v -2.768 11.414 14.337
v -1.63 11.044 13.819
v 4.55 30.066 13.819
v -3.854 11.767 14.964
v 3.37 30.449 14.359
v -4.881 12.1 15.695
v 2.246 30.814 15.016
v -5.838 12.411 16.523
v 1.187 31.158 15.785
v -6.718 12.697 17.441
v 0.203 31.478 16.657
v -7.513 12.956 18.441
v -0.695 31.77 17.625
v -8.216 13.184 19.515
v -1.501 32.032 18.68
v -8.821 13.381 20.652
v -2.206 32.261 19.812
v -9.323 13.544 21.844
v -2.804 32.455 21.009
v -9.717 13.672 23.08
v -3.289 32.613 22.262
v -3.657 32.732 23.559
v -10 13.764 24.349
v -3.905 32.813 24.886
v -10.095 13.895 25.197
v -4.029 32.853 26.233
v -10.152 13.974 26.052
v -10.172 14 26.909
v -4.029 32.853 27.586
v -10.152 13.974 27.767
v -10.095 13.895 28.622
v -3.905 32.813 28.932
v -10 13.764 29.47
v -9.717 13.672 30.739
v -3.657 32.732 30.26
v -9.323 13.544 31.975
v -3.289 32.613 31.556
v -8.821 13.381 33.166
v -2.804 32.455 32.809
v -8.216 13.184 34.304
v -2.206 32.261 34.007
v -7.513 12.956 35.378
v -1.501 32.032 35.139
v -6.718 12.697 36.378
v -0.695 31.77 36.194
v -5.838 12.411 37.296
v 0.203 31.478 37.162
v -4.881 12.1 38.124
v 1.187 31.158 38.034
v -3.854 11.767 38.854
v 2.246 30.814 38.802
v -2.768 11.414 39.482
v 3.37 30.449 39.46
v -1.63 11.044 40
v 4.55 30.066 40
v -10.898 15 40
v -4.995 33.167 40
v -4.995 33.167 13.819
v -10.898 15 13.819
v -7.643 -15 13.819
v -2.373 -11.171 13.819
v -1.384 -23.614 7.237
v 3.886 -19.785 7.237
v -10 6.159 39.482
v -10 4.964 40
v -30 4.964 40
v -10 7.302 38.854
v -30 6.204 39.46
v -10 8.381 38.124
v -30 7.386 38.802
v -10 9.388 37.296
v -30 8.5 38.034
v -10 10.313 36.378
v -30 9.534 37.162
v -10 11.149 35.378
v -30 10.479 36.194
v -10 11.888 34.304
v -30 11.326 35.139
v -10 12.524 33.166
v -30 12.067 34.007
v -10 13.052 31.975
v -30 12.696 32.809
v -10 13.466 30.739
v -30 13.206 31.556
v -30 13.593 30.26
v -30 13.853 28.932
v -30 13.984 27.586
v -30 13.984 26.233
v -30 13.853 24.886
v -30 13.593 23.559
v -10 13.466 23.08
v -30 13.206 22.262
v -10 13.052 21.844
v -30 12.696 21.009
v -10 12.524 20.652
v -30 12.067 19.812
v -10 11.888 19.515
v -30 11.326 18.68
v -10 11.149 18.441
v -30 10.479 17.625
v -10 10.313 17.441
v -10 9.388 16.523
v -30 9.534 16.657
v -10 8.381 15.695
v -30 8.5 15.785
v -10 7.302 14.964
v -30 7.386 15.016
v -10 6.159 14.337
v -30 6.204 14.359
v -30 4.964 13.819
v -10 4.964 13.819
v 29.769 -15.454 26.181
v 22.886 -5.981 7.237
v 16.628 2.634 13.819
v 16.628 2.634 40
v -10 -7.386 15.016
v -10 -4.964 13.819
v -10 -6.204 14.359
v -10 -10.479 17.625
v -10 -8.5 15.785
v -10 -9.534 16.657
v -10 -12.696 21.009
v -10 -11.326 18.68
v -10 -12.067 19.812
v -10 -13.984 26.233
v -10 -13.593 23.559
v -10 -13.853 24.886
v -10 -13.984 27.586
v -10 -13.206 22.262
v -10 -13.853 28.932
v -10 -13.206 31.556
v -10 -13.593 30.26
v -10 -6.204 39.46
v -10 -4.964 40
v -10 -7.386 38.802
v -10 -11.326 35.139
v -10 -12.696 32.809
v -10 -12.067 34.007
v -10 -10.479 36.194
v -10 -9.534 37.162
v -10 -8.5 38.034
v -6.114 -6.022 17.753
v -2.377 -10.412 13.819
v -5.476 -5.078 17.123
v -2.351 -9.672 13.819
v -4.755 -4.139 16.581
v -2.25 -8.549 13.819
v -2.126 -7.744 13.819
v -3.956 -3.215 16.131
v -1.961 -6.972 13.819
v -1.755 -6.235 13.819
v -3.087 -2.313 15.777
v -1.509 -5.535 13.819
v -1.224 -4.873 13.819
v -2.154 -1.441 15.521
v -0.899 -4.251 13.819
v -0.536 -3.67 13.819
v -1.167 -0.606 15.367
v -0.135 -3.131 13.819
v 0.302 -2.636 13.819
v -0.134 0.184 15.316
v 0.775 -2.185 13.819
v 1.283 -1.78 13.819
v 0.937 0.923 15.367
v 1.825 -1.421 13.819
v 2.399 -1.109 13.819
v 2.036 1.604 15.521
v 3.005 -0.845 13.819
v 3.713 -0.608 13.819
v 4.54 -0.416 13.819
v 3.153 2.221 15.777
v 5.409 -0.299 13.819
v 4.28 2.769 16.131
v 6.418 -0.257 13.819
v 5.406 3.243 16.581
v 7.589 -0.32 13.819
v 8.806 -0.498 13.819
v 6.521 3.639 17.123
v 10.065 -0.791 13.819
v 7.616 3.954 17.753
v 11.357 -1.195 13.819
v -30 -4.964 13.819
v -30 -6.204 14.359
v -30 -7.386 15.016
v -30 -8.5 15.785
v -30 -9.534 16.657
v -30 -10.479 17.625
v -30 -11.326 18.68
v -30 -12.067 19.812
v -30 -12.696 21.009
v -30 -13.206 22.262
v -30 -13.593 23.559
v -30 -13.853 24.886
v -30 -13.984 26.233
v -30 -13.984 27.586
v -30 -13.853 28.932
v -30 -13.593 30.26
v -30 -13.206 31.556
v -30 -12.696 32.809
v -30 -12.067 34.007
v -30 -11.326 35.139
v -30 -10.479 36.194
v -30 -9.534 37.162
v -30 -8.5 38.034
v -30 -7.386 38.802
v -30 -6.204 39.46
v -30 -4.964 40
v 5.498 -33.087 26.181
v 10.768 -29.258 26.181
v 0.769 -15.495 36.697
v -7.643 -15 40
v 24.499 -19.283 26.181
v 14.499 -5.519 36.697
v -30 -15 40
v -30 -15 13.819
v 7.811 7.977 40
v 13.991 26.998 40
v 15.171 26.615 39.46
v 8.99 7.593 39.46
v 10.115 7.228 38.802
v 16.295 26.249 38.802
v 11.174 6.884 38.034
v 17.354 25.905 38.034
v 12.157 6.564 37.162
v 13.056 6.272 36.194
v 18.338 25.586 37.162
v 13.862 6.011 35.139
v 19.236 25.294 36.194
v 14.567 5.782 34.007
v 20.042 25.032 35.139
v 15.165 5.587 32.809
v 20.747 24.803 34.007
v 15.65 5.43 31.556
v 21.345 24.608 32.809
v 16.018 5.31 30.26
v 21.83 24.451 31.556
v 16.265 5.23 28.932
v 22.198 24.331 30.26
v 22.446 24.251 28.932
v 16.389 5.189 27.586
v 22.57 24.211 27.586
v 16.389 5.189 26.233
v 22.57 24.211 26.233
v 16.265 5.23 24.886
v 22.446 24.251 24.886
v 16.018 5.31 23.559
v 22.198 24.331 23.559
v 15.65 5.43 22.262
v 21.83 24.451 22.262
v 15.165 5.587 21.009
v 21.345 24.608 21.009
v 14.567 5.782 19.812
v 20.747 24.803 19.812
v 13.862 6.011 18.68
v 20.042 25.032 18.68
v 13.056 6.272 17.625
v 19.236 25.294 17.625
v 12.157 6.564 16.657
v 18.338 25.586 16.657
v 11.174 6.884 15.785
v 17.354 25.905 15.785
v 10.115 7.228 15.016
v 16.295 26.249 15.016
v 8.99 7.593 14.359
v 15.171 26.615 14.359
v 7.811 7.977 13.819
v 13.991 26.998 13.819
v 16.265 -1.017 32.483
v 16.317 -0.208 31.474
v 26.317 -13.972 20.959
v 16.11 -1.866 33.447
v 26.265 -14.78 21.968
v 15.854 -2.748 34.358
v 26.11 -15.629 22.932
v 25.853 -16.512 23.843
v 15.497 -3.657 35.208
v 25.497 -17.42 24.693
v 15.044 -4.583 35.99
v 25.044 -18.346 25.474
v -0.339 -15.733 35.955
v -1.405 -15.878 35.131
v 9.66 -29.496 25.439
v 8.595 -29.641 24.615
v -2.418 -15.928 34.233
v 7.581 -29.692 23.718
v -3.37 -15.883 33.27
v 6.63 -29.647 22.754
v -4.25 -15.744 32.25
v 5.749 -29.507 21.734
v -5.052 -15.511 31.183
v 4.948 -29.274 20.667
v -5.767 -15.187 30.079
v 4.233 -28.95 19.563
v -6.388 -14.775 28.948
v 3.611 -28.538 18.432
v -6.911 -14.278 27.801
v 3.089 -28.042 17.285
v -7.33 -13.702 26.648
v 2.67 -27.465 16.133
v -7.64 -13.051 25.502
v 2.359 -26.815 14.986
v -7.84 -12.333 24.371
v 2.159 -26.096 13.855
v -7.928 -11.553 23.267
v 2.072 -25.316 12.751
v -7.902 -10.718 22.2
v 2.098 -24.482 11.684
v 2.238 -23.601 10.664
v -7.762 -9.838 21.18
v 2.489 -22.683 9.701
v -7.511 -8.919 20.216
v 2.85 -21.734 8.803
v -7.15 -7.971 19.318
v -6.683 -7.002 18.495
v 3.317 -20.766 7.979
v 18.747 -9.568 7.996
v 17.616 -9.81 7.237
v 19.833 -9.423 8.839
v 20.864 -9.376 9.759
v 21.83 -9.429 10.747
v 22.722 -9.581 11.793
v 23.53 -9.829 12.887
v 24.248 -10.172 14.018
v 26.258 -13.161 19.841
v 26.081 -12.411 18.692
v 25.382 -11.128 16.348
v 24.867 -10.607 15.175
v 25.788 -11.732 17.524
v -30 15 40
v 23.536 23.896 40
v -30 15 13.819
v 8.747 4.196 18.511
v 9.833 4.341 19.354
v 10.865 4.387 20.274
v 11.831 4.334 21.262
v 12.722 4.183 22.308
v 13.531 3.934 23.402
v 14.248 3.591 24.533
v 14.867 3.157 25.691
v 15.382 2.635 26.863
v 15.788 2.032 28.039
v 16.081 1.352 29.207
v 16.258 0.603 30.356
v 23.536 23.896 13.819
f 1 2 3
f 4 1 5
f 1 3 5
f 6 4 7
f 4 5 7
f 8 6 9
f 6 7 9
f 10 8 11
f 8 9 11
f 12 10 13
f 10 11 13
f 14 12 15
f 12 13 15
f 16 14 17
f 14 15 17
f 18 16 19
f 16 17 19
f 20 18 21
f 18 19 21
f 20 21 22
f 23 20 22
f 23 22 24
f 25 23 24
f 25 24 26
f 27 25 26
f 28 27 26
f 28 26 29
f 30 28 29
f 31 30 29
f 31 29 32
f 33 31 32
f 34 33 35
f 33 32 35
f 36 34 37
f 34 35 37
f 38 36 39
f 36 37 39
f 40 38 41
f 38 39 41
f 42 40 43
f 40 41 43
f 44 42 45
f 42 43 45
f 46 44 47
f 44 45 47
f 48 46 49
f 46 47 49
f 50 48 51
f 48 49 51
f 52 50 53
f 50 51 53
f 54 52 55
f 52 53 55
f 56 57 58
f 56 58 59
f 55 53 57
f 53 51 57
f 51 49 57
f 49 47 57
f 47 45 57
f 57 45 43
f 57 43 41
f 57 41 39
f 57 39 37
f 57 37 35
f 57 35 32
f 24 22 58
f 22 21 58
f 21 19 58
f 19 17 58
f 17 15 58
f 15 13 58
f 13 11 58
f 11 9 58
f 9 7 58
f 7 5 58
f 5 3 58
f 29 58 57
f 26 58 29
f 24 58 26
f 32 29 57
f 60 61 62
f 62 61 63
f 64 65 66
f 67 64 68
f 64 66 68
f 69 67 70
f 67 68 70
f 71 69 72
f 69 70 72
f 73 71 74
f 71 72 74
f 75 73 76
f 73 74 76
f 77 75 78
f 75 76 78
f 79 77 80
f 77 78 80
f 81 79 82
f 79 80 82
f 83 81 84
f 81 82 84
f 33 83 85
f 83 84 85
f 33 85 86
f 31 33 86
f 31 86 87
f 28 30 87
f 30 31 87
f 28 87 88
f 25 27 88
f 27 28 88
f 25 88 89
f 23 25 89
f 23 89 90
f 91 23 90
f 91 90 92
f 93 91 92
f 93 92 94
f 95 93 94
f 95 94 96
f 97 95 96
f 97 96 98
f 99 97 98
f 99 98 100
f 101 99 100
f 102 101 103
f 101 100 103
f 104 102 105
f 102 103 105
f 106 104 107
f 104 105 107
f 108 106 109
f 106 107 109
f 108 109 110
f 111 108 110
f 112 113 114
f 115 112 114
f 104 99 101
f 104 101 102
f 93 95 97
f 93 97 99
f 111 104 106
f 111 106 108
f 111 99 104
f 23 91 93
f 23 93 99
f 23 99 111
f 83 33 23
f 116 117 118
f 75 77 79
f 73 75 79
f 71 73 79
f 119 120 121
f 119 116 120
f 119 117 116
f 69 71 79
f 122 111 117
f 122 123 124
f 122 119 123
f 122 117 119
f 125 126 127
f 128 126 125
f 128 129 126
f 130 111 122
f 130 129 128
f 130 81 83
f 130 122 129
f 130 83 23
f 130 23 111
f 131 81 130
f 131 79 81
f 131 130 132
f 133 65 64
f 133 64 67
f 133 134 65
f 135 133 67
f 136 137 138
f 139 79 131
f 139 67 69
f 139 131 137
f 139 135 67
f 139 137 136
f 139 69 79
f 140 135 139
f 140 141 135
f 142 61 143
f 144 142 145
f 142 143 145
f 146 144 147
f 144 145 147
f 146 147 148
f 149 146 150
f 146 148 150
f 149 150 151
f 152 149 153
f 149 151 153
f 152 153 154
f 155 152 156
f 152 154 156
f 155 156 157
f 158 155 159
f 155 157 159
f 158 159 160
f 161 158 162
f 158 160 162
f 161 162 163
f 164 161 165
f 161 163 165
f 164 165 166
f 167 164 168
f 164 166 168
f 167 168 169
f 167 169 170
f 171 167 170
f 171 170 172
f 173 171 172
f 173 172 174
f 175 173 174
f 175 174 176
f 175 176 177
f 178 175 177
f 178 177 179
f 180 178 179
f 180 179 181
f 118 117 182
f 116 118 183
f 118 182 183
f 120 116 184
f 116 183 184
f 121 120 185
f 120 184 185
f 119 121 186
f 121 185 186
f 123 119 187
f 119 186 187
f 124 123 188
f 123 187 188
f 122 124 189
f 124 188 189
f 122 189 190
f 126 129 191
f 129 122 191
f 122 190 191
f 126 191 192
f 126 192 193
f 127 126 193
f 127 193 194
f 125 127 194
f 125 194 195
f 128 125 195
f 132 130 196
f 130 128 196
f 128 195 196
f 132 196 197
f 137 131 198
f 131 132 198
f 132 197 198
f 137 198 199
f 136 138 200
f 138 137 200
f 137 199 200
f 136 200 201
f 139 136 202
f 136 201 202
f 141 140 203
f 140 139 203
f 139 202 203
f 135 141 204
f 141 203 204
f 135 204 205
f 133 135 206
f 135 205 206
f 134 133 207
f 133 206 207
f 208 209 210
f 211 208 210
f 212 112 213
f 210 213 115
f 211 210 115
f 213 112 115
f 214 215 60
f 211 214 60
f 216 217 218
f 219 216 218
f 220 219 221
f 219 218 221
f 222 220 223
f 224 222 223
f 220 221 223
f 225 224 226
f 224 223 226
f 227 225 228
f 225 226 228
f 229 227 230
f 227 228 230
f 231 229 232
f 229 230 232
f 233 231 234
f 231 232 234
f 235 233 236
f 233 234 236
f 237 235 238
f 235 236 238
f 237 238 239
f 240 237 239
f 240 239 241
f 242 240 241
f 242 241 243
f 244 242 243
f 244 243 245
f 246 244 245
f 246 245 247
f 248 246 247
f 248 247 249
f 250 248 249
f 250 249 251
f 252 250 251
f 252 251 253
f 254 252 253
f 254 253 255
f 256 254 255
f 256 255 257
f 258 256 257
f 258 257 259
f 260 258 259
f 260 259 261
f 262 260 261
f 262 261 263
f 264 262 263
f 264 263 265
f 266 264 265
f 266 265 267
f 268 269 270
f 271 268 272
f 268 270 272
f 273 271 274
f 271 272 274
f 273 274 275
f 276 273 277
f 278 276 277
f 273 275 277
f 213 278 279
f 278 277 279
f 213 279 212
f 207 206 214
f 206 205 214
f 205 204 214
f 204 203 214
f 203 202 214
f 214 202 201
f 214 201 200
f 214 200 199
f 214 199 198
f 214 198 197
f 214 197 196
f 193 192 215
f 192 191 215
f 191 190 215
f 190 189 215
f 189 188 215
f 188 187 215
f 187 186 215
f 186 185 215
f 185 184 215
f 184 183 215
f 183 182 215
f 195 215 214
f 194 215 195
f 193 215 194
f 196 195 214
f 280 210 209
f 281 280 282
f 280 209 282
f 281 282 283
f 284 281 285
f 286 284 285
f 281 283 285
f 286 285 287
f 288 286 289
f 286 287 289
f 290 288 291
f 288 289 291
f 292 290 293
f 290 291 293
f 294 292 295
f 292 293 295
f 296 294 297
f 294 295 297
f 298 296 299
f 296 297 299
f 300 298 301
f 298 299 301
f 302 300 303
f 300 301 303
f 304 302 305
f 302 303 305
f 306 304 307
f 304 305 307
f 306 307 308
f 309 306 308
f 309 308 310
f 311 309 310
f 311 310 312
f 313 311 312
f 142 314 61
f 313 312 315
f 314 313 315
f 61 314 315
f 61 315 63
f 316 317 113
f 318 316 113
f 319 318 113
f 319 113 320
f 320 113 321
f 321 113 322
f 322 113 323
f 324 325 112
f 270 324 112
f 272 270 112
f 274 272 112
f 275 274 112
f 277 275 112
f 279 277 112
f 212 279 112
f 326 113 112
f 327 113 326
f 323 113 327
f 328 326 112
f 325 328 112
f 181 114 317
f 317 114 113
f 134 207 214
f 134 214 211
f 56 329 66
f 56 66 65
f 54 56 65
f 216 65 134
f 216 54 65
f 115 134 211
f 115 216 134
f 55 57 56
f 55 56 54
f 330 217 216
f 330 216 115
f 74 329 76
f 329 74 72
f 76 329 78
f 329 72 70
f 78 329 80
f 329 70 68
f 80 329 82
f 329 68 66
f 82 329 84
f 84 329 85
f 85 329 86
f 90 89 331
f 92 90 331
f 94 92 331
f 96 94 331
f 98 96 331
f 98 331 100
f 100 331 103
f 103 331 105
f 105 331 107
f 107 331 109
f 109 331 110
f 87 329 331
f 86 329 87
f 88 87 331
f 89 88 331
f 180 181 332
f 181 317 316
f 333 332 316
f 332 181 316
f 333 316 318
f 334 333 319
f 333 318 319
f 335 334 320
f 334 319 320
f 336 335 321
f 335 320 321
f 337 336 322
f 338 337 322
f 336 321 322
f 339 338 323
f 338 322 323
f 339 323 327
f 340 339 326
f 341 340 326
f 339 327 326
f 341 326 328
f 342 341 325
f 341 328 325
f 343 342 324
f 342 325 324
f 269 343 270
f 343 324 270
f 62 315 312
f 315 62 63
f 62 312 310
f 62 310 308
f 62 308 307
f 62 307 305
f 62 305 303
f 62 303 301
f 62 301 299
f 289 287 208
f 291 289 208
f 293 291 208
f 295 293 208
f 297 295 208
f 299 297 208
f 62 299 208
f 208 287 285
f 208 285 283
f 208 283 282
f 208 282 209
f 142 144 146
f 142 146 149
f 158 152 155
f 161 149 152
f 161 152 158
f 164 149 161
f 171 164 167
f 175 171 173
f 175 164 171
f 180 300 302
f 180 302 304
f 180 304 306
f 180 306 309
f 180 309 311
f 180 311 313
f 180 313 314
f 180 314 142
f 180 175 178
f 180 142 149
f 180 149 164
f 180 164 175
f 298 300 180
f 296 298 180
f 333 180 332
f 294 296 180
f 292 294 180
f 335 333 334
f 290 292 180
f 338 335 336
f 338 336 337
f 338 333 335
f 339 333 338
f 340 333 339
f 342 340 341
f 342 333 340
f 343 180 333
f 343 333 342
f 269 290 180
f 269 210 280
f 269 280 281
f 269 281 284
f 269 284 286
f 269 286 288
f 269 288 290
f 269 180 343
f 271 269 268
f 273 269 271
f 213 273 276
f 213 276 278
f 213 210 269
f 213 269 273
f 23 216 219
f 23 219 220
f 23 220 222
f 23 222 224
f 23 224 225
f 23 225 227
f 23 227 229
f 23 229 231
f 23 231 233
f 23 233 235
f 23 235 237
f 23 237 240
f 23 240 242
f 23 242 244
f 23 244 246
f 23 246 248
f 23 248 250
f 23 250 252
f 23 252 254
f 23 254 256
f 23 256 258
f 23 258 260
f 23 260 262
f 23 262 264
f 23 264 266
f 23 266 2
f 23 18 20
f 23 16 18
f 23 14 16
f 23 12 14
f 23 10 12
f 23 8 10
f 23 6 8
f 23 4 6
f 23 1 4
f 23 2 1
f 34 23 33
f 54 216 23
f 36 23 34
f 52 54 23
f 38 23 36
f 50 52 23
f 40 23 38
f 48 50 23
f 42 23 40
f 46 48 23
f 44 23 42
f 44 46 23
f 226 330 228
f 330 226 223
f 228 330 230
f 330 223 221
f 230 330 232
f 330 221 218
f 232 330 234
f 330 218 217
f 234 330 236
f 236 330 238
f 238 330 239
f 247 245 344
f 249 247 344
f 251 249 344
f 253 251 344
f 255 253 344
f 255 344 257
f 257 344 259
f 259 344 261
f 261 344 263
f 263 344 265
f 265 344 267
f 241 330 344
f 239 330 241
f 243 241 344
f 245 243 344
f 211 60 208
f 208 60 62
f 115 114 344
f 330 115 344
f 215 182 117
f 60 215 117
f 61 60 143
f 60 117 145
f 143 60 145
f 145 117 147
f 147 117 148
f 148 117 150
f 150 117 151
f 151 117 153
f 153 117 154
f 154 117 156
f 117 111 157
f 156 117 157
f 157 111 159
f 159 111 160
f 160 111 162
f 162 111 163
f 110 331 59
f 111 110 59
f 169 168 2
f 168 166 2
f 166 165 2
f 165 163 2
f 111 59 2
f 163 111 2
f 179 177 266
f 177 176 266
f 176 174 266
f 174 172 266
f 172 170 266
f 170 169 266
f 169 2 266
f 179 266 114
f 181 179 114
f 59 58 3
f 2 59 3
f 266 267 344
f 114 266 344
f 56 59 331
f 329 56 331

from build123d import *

# Parameters (mm, degrees)
F1_DEPTH  = 40
F3_DEPTH  = 30
F4_DEPTH  = 13.8188209357
F6_DEPTH  = 20
F7_R      = 14
F8_DEPTH  = 20
F9_R      = 14
F10_DEPTH = 20


with BuildPart() as f1:
    # F0 (on Top) → F1 (new body)
    with BuildSketch(Plane.XY):
        Polygon((17.6335575688, -24.2705098312), (0, 0), (-30, 0), (-30, -15), (-7.6428817424, -15), (5.4983026531, -33.0872886156), align=None)
        Polygon((9.2705098312, 28.5316954889), (0, 0), (17.6335575688, -24.2705098312), (29.7688124844, -15.4537310469), (16.6276280888, 2.6335575688), (23.5363575757, 23.8964405732), align=None)
        Polygon((-30, 0), (0, 0), (9.2705098312, 28.5316954889), (-4.9953379132, 33.1669504045), (-10.8981379201, 15), (-30, 15), align=None)
    extrude(amount=F1_DEPTH)

    # F2 (on face) → F3 (cut, through all)
    with BuildSketch(Plane(origin=(12.1352549156, 8.8167787844, 0), x_dir=(-0.5877852523, 0.8090169944, 0), z_dir=(0.8090169944, 0.5877852523, 0))):
        Polygon((-30, 26.1811790643), (-7.6428817424, 40), (-30, 40), align=None)
        Polygon((-18.2909047095, 7.2373321675), (-30, 26.1811790643), (-30, 0), (-7.6428817424, 0), (-7.6428817424, 13.8188209357), align=None)
    extrude(amount=-F3_DEPTH, mode=Mode.SUBTRACT)

    # F4 (cut, through all): a face of the model
    f4_faces = [f1.faces().sort_by_distance(p)[0] for p in [
        (-5.1613250879, 7.1039545366, 0),
    ]]
    extrude(f4_faces, amount=-F4_DEPTH, mode=Mode.SUBTRACT)

    # F5 (on face) → F6 (cut)
    with BuildSketch(Plane(origin=(5.8766333563, -8.0884919048, -6.1796670384), x_dir=(0.8660332683, 0.3973019791, 0.303541621), z_dir=(0.4999863781, -0.6881722113, -0.5257686082))):
        with BuildLine():
            ThreePointArc((13.555551142, 11.7065510585), (20.8125243081, 16.7507031763), (23.6020646696, 25.1367388722))
            ThreePointArc((23.6020646696, 25.1367388722), (23.0669801184, 28.9702818755), (21.5026286756, 32.5107863592))
            Line((21.5026286756, 32.5107863592), (5.6485781973, 38.566926686))
            ThreePointArc((5.6485781973, 38.566926686), (-3.4762295905, 30.1325590497), (-2.2984993363, 17.7626913852))
            Line((-2.2984993363, 17.7626913852), (13.555551142, 11.7065510585))
        make_face()
        with BuildLine():
            ThreePointArc((-2.2984993363, 17.7626913852), (4.6062444921, 12.0584446121), (13.555551142, 11.7065510585))
            Line((13.555551142, 11.7065510585), (-2.2984993363, 17.7626913852))
        make_face()
    extrude(amount=-F6_DEPTH, mode=Mode.SUBTRACT)

    # F7 (on face) → F8 (cut)
    with BuildSketch(Plane(origin=(9.2705098312, 28.5316954889, 0), x_dir=(-0.9510565163, 0.3090169944, 0), z_dir=(0.3090169944, 0.9510565163, 0))):
        with Locations((0, 26.9094104679)):
            Circle(F7_R)
    extrude(amount=-F8_DEPTH, mode=Mode.SUBTRACT)

    # F9 (on face) → F10 (cut)
    with BuildSketch(Plane(origin=(-30, 0, 0), x_dir=(0, -1, 0), z_dir=(-1, 0, 0))):
        with Locations((0, 26.9094104679)):
            Circle(F9_R)
    extrude(amount=-F10_DEPTH, mode=Mode.SUBTRACT)


solid = f1.part
